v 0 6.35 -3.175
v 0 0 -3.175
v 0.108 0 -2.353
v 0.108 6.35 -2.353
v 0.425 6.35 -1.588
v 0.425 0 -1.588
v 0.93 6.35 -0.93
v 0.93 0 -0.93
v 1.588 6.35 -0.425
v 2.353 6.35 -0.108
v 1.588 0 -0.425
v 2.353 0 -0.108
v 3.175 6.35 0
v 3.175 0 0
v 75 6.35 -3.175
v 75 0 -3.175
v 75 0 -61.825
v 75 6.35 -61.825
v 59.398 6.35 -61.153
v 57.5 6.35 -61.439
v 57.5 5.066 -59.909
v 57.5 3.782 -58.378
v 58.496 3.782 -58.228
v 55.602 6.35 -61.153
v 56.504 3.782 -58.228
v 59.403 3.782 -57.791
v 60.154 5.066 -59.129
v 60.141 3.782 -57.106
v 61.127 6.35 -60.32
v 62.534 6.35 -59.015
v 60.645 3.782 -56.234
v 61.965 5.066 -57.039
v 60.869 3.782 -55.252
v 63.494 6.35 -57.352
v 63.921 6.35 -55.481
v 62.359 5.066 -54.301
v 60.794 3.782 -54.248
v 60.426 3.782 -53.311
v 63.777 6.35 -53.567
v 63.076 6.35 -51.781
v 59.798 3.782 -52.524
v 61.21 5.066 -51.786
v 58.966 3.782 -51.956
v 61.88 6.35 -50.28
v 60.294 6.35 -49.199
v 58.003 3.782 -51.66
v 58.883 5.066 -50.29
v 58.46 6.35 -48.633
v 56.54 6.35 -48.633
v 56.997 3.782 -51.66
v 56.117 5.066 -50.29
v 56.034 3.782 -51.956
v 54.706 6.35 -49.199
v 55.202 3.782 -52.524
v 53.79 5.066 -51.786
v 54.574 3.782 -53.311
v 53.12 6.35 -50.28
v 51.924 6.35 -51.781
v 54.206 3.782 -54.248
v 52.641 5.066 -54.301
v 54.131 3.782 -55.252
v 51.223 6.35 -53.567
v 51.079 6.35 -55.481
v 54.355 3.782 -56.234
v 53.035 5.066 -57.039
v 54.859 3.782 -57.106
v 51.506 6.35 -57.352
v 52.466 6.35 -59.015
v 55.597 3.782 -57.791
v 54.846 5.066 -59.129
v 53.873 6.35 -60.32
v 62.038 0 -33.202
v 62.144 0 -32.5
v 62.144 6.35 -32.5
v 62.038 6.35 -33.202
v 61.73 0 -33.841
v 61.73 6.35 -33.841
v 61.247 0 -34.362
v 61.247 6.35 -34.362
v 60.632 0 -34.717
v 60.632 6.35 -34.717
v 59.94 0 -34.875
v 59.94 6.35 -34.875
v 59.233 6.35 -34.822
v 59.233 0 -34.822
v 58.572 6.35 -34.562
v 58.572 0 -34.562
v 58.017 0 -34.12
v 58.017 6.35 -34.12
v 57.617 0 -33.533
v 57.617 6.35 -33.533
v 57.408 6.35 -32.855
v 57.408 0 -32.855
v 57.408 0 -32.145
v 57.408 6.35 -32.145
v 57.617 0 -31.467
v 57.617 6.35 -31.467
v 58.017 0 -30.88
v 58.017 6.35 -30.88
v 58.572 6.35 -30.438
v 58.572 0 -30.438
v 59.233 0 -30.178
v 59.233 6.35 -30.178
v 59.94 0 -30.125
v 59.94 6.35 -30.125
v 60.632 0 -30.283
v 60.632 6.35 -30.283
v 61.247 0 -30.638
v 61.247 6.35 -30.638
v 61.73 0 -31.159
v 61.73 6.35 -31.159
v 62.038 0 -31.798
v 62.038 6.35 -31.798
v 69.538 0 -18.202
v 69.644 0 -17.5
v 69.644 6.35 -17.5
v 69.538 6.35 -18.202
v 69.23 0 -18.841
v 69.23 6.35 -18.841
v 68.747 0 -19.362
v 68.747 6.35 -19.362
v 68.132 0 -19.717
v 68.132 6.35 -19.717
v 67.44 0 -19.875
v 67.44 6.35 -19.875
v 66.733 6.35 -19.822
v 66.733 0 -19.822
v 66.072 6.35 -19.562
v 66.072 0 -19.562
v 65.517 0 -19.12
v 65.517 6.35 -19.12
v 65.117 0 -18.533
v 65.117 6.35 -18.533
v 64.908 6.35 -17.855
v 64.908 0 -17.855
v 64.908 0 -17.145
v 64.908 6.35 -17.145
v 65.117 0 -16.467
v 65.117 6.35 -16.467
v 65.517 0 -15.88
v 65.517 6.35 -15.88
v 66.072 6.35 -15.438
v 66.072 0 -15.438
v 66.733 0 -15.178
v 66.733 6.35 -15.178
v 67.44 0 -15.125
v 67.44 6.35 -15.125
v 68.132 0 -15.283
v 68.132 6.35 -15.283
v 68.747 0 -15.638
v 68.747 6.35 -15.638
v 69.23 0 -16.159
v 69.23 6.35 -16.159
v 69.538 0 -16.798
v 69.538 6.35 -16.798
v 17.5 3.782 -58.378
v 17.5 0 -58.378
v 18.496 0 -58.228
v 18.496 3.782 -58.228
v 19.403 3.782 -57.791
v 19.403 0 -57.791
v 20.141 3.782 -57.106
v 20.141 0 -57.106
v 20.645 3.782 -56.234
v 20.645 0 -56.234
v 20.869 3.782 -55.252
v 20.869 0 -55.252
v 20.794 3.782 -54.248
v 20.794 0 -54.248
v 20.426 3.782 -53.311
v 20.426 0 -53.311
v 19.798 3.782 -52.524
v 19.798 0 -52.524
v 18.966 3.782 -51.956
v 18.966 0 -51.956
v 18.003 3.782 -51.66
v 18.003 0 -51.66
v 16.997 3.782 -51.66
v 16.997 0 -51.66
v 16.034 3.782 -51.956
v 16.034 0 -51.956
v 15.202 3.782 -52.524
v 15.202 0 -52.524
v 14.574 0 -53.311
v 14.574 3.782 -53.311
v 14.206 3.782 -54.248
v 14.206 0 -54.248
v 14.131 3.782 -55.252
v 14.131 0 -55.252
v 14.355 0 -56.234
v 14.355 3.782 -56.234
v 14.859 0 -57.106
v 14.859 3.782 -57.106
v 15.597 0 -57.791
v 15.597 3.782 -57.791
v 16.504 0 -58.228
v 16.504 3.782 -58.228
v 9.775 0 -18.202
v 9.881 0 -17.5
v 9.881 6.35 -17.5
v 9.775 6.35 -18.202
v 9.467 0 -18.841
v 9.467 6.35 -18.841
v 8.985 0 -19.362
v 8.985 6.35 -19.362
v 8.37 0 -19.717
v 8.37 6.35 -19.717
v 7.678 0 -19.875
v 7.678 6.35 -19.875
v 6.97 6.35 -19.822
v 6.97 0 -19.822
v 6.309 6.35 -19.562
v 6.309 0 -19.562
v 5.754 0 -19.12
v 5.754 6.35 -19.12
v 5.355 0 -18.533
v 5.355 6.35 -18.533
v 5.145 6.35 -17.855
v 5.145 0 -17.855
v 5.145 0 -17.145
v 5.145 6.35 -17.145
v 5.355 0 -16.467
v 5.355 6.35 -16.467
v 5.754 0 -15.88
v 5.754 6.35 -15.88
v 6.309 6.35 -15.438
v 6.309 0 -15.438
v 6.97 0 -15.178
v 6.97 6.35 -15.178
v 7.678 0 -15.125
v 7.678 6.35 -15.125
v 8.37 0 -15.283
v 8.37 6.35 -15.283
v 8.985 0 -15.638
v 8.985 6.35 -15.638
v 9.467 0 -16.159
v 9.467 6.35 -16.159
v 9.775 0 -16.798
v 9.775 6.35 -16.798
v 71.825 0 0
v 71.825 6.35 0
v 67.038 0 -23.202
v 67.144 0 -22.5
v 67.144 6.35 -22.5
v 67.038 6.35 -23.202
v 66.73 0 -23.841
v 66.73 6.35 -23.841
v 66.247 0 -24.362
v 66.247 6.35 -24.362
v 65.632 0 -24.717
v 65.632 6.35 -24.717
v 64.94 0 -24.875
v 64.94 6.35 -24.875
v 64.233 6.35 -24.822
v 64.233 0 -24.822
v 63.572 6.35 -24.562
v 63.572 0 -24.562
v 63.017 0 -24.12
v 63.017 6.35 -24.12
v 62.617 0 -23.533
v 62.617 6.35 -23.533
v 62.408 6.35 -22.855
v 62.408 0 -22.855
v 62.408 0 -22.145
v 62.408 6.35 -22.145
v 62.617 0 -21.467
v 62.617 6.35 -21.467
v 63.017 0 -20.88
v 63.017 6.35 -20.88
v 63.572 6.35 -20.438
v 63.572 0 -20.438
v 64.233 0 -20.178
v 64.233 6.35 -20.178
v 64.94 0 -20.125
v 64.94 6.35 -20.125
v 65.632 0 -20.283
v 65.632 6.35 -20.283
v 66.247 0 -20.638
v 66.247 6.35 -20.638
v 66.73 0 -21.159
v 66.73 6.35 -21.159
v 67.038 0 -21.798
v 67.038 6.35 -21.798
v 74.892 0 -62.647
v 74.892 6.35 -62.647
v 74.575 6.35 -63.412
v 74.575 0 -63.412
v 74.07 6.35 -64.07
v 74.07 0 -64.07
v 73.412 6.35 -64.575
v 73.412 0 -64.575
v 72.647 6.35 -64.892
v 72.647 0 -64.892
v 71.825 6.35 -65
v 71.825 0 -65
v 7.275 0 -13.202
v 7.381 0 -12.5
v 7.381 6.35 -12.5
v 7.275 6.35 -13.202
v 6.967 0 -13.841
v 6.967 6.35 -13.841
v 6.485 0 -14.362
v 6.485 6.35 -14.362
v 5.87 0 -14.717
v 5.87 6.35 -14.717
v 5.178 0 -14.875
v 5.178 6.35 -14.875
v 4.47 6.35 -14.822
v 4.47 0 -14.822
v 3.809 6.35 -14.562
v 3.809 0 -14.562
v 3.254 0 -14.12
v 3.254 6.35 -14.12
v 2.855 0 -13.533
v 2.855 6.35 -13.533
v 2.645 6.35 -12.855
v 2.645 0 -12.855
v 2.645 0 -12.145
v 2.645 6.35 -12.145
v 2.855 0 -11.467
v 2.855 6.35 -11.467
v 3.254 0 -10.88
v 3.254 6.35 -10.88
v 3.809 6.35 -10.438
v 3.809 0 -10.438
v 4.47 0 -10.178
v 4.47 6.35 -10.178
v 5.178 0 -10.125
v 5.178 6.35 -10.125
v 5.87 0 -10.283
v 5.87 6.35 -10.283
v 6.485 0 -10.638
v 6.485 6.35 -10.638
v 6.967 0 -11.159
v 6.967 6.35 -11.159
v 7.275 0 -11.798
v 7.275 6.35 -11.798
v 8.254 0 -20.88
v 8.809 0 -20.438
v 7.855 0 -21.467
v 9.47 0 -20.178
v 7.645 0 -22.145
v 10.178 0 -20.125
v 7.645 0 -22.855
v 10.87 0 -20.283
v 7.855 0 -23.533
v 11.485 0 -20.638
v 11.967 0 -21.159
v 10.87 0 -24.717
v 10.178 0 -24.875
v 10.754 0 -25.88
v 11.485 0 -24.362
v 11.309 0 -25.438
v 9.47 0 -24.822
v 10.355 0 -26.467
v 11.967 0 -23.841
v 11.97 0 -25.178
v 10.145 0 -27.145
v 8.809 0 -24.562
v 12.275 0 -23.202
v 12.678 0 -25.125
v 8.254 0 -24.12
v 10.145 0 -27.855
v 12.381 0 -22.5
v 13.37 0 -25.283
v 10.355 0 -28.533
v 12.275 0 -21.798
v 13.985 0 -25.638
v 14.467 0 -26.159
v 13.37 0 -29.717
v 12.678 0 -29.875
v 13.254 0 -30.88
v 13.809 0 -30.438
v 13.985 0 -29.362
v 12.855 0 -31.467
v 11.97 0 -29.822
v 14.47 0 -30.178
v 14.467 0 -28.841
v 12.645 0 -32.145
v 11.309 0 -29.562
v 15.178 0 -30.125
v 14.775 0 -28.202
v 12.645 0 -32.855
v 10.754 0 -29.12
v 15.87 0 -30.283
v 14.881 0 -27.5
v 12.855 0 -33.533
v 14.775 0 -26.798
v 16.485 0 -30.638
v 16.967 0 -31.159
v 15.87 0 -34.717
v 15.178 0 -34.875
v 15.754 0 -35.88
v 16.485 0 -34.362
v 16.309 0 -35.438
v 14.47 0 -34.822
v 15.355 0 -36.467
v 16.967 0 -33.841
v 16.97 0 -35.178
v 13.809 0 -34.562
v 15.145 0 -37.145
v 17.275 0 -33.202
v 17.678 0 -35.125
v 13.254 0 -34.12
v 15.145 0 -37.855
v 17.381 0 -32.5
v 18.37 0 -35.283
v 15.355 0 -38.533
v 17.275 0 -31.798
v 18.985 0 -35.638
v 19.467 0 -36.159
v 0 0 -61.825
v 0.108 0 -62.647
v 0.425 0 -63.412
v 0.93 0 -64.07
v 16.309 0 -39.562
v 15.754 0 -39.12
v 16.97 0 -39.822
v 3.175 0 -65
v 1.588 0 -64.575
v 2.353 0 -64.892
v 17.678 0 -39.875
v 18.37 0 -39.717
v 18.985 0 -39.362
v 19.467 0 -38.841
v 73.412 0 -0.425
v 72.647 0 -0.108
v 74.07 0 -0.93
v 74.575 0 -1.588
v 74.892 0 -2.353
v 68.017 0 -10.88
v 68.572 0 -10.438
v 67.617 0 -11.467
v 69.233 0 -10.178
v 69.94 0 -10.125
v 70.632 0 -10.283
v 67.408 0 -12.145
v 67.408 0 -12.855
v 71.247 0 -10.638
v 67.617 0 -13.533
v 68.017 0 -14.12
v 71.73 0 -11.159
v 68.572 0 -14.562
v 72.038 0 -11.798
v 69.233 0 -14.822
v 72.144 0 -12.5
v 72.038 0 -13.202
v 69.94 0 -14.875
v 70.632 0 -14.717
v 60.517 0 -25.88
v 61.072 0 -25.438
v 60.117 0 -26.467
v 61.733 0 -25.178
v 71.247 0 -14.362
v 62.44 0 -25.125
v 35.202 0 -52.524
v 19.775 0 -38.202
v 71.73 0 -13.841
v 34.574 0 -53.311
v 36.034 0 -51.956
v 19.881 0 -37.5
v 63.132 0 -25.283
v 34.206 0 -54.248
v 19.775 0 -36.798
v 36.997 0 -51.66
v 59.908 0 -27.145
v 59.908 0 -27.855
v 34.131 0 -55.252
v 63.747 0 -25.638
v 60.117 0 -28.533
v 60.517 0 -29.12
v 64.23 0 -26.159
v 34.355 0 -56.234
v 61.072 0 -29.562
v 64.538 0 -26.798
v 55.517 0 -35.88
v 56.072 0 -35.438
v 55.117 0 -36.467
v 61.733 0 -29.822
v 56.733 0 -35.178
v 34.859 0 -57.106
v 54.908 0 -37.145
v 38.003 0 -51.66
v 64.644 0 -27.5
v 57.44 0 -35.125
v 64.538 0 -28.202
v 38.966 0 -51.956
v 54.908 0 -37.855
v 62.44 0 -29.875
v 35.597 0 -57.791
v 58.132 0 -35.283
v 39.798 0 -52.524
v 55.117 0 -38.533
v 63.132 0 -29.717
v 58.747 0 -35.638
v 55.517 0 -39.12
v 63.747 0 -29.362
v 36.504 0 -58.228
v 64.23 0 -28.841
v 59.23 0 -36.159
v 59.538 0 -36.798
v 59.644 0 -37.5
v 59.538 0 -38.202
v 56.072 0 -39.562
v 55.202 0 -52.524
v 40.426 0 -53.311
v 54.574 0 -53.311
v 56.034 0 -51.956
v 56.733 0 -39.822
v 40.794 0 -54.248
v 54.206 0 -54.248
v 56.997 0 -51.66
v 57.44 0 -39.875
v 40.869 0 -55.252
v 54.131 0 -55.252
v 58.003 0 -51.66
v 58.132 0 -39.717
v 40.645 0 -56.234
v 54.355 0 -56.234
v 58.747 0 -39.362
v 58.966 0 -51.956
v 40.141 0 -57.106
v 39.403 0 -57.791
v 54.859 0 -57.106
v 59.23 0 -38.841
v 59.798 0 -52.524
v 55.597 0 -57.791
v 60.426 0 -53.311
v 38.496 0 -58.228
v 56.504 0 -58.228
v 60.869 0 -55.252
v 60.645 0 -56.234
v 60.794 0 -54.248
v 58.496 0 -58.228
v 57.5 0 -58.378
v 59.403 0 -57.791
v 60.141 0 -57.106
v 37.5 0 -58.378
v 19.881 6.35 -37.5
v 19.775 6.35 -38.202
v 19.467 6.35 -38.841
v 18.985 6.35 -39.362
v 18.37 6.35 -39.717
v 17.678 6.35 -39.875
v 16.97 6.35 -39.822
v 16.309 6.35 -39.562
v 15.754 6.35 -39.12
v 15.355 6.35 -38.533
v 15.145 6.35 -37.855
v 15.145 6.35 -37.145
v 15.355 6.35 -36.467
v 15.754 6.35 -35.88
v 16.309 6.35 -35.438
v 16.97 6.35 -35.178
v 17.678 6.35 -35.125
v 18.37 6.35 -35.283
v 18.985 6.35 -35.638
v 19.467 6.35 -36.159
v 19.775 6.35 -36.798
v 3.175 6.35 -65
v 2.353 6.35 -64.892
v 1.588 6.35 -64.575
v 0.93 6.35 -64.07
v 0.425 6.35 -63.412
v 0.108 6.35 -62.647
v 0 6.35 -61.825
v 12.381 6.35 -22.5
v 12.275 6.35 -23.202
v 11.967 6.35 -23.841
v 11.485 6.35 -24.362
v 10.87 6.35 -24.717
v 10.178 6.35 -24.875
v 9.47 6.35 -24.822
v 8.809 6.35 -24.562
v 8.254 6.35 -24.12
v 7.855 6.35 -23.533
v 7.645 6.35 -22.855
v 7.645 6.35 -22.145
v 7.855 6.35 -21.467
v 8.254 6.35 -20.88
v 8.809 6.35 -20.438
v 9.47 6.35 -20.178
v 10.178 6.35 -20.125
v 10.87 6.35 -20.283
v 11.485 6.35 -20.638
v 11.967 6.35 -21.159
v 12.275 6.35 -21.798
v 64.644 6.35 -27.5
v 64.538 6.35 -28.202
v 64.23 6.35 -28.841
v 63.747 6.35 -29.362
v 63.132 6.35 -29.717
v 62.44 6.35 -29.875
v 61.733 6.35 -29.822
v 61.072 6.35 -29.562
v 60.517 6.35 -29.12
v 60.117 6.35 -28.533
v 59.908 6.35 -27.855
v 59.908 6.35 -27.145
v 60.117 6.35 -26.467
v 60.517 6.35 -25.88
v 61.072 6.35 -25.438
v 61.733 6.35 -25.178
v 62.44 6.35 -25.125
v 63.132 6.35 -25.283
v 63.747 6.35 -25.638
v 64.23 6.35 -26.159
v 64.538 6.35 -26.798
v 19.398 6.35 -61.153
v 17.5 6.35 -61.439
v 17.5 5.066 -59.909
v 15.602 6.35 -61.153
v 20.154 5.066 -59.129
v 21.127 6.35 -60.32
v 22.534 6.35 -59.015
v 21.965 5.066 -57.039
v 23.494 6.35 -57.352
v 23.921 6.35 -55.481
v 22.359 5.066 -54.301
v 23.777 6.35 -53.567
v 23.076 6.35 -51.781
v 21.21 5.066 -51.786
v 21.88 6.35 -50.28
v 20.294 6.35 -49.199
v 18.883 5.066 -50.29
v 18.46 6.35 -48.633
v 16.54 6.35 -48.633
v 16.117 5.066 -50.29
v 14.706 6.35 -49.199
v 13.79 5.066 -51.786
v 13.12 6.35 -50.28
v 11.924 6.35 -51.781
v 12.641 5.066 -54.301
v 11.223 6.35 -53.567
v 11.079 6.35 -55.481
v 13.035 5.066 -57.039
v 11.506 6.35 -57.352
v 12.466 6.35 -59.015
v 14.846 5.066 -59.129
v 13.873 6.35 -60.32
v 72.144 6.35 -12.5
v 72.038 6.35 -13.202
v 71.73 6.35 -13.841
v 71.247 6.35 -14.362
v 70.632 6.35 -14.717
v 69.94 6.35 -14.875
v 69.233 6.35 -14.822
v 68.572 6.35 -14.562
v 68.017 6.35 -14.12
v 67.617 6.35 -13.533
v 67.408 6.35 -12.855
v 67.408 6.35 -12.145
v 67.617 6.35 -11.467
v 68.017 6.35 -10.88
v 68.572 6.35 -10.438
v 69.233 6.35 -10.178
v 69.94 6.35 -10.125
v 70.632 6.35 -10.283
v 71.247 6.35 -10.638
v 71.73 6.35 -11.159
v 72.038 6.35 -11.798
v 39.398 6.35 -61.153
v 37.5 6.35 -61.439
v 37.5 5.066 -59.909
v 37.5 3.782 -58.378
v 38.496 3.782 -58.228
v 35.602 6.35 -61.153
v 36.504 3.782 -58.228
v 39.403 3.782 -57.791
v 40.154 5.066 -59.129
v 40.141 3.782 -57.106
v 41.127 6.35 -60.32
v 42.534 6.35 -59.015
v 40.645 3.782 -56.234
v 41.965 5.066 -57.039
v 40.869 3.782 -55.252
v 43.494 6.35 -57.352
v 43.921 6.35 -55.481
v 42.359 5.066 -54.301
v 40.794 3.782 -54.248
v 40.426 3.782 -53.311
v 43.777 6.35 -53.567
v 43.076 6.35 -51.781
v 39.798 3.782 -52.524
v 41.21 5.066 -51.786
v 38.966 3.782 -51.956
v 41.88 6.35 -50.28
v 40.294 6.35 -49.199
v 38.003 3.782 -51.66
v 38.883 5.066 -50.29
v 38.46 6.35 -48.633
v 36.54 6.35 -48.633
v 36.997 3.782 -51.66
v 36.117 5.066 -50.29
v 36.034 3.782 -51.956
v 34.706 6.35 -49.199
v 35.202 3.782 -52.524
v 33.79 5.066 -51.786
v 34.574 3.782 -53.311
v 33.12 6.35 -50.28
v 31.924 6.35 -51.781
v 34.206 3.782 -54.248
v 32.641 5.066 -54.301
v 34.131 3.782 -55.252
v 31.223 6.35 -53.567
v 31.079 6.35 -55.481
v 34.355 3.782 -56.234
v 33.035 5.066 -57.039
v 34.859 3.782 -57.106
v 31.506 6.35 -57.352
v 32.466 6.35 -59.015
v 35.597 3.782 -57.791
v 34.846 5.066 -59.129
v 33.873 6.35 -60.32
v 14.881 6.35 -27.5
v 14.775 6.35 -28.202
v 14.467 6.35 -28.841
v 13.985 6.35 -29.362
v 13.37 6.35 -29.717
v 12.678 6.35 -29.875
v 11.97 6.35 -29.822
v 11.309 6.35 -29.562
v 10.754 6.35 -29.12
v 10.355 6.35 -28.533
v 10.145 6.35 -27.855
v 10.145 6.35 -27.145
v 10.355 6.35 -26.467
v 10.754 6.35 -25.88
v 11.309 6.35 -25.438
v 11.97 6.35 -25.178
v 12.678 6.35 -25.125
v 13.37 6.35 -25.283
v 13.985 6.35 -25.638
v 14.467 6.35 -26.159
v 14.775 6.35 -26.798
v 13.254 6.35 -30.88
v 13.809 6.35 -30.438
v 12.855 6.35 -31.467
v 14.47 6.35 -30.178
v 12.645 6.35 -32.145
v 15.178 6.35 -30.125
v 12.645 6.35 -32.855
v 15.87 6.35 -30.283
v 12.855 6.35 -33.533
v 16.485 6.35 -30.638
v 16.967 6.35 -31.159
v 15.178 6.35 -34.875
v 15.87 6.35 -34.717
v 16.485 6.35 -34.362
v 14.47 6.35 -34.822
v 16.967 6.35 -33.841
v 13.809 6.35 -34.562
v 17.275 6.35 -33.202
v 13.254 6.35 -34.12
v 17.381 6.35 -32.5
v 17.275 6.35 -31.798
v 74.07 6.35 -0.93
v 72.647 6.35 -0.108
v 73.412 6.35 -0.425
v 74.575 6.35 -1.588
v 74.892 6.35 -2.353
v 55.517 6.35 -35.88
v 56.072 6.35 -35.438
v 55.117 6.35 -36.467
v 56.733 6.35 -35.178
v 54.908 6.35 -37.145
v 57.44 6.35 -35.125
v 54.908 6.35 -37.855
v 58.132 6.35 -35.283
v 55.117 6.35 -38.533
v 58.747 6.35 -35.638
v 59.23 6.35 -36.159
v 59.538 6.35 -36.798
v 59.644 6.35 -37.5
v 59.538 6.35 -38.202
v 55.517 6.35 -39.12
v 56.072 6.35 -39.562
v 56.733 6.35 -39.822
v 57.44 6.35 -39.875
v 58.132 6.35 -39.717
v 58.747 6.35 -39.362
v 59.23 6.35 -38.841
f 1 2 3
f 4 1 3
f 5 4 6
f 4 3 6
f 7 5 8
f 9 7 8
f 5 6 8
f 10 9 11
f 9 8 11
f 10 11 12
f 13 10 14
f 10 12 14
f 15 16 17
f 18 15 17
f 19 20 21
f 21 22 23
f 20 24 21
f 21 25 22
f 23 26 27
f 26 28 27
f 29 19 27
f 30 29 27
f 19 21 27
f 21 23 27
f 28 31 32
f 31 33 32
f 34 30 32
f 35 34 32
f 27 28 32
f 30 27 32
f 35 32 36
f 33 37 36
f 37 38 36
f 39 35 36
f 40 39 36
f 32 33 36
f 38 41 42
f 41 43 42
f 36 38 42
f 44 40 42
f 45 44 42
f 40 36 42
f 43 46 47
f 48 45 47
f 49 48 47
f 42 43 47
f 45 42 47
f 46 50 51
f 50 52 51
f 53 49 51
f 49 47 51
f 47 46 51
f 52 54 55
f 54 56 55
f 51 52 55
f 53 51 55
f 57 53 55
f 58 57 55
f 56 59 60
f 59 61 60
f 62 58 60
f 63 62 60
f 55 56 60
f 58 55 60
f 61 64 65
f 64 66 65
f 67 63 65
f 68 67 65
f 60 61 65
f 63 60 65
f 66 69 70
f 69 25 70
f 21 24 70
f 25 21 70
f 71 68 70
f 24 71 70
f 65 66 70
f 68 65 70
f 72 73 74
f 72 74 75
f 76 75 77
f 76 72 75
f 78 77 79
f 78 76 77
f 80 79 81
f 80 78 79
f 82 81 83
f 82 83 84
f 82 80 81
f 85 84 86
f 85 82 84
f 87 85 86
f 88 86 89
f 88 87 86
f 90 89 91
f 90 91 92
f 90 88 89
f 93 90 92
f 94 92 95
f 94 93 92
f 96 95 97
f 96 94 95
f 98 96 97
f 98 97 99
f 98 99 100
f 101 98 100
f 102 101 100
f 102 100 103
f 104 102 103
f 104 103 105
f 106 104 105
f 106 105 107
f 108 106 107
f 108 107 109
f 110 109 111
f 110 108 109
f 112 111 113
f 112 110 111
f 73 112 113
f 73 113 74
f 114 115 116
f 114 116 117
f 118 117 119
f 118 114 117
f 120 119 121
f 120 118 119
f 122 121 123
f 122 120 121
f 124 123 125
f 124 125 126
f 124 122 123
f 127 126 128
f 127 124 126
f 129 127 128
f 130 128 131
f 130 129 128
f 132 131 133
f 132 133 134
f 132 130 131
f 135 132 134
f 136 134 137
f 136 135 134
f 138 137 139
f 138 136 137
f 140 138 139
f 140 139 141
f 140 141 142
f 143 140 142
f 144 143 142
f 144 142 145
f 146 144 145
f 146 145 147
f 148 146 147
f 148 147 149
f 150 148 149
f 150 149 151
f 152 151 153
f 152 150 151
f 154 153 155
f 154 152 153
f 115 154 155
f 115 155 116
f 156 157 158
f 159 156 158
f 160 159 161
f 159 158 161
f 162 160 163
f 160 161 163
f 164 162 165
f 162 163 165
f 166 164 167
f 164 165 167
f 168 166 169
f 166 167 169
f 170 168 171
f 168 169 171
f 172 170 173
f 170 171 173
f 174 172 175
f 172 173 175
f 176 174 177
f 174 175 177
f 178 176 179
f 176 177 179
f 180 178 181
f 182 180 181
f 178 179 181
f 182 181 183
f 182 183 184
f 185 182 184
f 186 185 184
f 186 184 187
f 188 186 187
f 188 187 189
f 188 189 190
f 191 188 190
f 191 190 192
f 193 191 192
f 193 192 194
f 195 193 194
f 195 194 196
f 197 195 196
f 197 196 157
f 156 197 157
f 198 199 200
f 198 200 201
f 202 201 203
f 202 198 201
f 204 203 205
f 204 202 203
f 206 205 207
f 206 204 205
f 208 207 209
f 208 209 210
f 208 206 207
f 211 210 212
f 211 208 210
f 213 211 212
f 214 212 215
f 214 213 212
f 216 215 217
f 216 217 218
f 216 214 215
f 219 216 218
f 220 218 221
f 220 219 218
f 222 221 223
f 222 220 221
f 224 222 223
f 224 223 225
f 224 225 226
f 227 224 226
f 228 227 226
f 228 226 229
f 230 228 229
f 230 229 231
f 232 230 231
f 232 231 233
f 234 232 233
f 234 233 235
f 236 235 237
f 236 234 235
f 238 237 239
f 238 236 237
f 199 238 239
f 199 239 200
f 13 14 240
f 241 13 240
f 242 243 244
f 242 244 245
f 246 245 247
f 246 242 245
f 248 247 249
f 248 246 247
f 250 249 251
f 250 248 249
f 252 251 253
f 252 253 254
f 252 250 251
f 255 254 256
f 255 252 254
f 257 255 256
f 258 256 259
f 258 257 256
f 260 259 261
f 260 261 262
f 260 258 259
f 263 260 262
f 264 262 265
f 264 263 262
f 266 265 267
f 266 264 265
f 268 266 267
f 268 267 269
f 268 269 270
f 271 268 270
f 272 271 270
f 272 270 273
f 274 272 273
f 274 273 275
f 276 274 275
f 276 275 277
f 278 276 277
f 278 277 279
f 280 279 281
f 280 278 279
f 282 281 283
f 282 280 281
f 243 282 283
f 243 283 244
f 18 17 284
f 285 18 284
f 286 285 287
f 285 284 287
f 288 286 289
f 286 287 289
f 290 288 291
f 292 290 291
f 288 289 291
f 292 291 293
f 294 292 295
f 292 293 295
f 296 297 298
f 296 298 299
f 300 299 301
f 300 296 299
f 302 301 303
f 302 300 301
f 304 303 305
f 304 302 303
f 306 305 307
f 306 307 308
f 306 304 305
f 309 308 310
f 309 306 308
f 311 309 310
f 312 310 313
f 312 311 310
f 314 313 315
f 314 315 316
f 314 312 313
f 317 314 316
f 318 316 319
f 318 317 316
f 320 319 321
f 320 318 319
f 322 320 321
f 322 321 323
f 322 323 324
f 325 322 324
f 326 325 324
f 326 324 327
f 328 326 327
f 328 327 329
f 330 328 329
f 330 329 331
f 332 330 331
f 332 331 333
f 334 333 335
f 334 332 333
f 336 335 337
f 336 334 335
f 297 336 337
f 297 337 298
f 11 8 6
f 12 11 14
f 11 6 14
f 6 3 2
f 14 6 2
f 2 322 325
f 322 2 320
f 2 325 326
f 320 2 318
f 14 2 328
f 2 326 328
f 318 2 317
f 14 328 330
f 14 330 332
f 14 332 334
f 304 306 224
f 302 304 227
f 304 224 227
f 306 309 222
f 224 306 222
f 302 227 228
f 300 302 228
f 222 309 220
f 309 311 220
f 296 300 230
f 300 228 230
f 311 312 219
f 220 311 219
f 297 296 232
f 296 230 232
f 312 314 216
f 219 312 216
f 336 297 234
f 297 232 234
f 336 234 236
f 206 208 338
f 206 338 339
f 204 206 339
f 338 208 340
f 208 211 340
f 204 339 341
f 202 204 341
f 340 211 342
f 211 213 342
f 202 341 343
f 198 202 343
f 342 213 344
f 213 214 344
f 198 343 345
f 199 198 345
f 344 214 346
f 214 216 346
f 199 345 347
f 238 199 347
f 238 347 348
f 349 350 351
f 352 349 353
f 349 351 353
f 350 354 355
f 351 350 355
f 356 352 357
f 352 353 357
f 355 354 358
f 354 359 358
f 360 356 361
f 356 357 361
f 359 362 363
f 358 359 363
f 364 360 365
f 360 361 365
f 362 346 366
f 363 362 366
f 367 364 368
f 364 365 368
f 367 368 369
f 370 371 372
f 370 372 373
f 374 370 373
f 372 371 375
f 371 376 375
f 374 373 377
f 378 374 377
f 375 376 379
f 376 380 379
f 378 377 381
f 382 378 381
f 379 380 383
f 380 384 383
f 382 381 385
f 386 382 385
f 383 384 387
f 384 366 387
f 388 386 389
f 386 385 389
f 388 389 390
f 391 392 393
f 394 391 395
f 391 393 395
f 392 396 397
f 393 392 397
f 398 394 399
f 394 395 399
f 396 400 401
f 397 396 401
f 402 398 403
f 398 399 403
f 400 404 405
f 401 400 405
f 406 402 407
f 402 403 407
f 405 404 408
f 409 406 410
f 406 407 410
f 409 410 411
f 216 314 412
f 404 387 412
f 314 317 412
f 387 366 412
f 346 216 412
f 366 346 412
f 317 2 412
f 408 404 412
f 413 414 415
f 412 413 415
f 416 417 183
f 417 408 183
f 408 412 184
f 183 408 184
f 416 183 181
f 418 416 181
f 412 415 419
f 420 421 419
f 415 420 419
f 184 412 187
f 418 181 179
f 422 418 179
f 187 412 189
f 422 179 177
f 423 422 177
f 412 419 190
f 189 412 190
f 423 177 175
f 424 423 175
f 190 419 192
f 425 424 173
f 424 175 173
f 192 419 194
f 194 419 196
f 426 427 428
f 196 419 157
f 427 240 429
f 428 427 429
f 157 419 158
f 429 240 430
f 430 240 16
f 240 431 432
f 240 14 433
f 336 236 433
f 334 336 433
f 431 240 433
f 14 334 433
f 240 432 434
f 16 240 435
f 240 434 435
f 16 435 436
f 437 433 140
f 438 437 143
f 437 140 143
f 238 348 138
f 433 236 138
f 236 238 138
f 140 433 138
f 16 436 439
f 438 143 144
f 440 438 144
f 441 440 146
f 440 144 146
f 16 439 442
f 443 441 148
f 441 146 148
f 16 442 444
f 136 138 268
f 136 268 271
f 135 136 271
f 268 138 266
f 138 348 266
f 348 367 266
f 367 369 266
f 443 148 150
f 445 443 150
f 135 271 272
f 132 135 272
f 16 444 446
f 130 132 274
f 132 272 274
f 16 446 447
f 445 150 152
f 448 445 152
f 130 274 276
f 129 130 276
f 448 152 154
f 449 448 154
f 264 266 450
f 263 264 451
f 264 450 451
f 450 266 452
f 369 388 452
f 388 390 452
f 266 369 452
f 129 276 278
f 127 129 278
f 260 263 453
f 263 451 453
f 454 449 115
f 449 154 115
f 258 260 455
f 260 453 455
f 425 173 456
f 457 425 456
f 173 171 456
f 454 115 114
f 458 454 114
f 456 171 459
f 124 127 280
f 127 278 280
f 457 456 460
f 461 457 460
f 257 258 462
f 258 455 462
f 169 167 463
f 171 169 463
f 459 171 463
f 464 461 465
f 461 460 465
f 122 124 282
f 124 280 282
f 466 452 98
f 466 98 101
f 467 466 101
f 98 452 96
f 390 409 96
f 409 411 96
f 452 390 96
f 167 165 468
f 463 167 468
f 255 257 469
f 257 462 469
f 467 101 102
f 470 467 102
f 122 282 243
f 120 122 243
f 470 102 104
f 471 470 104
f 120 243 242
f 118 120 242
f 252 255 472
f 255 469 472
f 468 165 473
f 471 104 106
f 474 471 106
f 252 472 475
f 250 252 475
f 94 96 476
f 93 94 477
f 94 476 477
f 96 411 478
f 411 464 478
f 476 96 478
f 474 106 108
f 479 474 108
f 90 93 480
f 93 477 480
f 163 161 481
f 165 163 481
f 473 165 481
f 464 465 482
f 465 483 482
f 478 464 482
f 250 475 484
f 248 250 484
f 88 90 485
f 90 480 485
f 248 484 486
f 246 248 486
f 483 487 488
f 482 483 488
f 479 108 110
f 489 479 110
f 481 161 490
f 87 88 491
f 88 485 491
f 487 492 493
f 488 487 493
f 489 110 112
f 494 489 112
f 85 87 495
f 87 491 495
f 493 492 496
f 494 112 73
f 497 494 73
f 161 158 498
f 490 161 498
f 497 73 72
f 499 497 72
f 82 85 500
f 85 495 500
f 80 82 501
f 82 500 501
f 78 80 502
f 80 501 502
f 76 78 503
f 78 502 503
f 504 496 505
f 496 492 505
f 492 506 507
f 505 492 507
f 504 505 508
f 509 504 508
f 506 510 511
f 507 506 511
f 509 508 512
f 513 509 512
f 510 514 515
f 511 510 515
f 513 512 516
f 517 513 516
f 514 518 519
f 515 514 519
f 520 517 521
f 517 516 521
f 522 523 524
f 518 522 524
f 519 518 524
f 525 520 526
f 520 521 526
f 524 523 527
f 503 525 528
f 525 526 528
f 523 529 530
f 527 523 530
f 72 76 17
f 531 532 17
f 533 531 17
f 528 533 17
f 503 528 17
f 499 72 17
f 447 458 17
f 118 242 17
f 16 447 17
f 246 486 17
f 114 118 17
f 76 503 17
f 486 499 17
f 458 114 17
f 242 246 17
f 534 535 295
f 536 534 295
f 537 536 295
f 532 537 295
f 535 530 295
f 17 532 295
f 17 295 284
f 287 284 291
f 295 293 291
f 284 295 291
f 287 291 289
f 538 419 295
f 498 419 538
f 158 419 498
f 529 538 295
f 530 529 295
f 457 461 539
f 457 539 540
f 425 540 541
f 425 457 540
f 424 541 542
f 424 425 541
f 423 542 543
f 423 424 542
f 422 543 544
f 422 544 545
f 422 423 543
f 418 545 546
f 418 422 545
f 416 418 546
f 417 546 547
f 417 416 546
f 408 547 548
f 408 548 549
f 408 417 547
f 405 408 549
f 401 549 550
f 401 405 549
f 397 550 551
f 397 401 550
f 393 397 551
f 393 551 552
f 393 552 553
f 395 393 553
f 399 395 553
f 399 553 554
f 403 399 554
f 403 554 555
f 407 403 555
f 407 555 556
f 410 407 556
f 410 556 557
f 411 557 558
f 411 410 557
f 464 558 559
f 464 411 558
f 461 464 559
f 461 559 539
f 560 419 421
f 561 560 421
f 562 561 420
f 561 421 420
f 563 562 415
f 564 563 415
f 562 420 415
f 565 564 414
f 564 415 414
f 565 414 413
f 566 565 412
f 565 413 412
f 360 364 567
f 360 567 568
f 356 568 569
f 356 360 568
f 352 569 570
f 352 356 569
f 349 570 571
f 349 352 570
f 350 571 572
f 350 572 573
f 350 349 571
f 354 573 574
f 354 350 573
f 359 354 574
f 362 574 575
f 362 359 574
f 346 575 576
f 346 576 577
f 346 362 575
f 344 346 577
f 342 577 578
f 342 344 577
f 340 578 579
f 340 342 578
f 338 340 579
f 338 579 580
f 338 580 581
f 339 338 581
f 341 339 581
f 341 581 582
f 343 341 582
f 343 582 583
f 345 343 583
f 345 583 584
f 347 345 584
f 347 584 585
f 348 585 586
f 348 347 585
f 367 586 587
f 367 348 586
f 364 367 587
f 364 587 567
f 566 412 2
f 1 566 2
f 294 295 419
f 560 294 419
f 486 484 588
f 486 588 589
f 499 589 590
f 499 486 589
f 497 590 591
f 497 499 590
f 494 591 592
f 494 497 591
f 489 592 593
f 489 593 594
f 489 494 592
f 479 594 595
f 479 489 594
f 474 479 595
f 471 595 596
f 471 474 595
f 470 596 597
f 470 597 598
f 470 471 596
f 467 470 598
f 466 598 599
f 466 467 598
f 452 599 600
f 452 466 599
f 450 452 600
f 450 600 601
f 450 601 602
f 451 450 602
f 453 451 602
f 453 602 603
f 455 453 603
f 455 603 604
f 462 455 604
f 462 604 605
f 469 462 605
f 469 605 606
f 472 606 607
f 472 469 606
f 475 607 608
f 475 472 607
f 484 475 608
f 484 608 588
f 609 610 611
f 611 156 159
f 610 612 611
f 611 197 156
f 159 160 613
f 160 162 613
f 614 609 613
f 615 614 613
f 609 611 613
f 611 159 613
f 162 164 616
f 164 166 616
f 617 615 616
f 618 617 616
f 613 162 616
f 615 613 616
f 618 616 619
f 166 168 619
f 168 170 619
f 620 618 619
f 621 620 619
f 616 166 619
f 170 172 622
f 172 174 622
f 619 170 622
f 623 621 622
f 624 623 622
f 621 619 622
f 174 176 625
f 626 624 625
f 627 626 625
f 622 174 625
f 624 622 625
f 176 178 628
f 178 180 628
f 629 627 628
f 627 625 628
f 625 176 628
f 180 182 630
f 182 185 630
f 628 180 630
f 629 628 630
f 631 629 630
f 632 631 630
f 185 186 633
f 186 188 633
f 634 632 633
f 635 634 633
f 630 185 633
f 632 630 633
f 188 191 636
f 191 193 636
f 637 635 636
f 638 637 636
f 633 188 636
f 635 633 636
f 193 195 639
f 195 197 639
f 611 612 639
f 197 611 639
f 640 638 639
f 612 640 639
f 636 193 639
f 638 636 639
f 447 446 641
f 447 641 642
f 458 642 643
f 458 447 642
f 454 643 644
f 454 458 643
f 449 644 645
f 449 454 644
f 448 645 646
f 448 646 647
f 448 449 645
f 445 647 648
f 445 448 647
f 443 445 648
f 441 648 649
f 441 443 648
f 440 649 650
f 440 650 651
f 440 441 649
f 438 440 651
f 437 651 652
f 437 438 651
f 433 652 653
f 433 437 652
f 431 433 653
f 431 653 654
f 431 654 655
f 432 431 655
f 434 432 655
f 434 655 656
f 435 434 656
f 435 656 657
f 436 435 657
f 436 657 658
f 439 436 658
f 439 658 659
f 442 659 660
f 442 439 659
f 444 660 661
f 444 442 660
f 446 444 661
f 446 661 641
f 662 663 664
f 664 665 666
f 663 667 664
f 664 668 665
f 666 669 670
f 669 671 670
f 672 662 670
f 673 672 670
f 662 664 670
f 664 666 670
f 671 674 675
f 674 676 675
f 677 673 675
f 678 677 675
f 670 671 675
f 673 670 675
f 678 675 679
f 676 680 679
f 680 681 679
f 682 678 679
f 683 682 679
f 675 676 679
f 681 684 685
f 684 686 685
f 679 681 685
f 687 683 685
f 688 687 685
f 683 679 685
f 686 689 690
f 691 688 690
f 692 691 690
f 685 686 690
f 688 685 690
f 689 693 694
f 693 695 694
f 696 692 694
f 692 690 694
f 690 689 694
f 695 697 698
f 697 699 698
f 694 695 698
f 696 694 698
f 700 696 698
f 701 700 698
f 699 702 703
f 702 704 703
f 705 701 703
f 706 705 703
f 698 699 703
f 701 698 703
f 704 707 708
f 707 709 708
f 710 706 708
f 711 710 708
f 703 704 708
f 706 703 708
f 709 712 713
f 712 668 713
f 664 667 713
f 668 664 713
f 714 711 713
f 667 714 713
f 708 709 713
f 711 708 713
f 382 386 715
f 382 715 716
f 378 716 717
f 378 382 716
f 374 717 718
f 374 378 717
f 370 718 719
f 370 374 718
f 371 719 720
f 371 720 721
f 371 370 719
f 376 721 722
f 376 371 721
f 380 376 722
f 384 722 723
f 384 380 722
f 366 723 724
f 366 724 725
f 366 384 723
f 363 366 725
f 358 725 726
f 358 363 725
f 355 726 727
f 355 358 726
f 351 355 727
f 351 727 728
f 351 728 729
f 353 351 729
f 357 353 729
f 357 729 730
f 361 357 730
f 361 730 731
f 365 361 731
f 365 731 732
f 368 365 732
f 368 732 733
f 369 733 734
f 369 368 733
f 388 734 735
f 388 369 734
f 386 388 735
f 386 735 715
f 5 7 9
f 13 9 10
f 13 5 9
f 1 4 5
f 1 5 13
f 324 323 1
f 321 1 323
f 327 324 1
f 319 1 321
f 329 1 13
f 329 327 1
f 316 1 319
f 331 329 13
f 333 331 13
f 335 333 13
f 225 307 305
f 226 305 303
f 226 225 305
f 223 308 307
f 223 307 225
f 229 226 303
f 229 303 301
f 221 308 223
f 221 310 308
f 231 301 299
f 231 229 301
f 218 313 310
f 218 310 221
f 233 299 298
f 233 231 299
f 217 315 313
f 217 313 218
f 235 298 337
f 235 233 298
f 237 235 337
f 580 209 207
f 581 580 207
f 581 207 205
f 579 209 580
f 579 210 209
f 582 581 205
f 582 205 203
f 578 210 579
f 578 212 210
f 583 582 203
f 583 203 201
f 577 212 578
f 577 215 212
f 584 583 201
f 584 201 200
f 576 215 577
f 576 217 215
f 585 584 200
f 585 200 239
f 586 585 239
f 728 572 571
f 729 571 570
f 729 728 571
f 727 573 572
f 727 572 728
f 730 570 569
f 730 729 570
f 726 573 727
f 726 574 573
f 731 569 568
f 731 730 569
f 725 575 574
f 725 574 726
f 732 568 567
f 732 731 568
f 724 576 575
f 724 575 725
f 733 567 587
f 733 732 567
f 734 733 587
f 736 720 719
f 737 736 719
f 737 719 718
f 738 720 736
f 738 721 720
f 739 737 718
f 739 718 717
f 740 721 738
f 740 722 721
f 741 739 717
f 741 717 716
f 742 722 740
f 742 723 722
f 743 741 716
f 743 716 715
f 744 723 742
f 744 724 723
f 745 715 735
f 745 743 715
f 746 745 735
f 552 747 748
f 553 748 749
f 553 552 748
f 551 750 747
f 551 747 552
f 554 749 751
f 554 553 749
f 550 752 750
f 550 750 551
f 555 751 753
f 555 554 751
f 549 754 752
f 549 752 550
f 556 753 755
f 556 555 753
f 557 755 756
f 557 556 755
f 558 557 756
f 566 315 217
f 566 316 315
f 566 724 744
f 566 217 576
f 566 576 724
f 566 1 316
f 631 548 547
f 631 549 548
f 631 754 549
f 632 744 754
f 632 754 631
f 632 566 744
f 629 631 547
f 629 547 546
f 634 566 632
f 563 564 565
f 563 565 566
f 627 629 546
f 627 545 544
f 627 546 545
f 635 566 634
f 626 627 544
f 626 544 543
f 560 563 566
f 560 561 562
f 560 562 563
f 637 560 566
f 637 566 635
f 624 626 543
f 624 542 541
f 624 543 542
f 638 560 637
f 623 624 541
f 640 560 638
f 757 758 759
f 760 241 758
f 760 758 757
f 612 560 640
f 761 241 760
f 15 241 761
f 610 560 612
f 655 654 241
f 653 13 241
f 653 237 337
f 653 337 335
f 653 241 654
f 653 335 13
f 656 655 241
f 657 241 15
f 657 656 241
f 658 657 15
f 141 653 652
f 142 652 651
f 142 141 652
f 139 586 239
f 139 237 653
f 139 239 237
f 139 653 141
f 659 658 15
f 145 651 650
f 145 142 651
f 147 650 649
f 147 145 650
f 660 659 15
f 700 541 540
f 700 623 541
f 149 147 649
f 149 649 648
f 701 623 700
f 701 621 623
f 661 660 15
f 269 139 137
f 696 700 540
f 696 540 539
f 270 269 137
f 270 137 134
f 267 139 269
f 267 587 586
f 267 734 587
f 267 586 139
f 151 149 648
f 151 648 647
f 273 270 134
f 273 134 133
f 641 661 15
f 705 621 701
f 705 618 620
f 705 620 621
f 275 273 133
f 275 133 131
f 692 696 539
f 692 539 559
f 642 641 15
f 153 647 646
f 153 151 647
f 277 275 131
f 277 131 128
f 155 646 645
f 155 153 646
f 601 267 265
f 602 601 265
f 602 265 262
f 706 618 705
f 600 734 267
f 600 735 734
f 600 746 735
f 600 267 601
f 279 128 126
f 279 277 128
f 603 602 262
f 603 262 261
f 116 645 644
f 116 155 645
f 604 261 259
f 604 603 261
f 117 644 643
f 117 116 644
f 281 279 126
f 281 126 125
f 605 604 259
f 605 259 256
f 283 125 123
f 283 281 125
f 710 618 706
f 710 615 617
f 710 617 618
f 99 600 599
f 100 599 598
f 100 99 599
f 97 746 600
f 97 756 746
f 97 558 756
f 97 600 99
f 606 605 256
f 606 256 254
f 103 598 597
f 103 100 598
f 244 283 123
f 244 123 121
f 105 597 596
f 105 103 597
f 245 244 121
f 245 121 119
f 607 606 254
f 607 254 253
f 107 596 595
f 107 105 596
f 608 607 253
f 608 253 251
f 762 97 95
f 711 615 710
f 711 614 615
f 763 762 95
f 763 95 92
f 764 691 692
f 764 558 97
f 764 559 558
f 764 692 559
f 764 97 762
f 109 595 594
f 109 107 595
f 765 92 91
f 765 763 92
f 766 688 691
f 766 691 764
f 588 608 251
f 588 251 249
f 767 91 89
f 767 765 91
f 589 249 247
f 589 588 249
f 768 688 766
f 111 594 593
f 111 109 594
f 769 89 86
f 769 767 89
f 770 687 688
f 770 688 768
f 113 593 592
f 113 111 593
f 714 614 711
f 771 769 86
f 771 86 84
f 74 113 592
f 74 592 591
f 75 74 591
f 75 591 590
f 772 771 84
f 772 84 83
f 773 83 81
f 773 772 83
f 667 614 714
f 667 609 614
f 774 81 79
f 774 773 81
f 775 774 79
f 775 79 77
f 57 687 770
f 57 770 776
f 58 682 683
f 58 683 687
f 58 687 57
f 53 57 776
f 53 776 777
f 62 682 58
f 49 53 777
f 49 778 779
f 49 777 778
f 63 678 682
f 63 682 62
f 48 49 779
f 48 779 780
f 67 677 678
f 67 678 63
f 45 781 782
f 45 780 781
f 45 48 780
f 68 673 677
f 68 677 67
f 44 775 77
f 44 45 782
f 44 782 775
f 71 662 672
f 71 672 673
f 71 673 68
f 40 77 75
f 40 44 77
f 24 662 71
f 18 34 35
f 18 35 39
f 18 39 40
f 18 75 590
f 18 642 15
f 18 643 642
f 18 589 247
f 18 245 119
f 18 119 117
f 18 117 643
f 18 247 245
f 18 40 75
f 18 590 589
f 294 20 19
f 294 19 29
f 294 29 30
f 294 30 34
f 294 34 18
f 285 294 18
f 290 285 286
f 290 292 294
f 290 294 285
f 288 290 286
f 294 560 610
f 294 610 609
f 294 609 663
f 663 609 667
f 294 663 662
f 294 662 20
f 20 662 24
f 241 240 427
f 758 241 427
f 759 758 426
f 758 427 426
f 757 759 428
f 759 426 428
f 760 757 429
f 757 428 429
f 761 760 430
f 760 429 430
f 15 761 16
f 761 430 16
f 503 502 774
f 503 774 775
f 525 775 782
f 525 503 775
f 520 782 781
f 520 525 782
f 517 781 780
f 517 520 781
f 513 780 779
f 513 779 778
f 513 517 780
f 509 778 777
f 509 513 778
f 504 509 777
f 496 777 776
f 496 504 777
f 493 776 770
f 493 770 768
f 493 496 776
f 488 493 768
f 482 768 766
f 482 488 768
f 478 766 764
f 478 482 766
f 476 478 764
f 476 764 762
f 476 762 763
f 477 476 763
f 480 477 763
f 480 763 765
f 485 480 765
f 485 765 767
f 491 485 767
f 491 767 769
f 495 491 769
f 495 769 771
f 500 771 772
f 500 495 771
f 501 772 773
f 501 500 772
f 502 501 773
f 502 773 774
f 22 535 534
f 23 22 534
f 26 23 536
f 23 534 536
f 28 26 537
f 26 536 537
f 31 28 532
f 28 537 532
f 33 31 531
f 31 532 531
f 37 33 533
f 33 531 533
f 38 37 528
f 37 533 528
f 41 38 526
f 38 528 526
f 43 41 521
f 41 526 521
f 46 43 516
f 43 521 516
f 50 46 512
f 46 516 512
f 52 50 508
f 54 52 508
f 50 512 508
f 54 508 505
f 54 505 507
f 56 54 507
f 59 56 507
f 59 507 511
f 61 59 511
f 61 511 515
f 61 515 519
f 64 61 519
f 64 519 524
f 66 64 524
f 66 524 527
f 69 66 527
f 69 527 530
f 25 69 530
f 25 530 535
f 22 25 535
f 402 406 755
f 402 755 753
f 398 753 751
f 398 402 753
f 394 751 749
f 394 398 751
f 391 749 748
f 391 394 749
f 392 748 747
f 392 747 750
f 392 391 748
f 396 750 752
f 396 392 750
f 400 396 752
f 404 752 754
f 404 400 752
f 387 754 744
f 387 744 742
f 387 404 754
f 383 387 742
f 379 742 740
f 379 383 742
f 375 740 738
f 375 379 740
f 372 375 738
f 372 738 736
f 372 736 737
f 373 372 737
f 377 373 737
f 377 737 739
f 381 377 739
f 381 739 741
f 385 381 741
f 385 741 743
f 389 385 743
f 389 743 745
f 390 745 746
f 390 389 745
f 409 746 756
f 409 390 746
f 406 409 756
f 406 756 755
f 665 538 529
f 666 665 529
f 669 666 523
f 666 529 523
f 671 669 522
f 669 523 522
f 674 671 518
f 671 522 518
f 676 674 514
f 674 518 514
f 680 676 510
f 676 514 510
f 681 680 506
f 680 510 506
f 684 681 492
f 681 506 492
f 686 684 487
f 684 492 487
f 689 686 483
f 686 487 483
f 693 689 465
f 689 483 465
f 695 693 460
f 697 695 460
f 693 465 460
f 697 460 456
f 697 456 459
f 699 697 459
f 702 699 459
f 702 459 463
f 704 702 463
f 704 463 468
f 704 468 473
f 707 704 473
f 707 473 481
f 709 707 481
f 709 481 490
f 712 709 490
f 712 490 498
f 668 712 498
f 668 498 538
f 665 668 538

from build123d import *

# Parameters (mm, degrees)
SKETCH1_R                                           = 2.38125
SKETCH1_R_2                                         = 3.3
BOSS_EXTRUDE1_DEPTH                                 = 6.35
CSK_FOR_1_4_FLAT_HEAD_MACHINE_SCREW_100_D           = 6.7564
CSK_FOR_1_4_FLAT_HEAD_MACHINE_SCREW_100_DEPTH       = 6.35
CSK_FOR_1_4_FLAT_HEAD_MACHINE_SCREW_100_CSINK_D     = 12.8778
CSK_FOR_1_4_FLAT_HEAD_MACHINE_SCREW_100_CSINK_ANGLE = 100


with BuildPart() as part:
    # Sketch1 → Boss-Extrude1 (new body)
    with BuildSketch(Plane(origin=(0, 0, 0), x_dir=(1, 0, 0), z_dir=(0, 1, 0))):
        with BuildLine():
            Line((3.175, 0), (71.825, 0))
            ThreePointArc((71.825, 0), (74.07006403, 0.92993597), (75, 3.175))
            Line((75, 3.175), (75, 61.825))
            ThreePointArc((75, 61.825), (74.07006403, 64.07006403), (71.825, 65))
            Line((71.825, 65), (3.175, 65))
            ThreePointArc((3.175, 65), (0.92993597, 64.07006403), (0, 61.825))
            Line((0, 61.825), (0, 3.175))
            ThreePointArc((0, 3.175), (0.92993597, 0.92993597), (3.175, 0))
        make_face()
        with Locations((5, 12.5)):
            Circle(SKETCH1_R, mode=Mode.SUBTRACT)
        with Locations((69.7625, 12.5)):
            Circle(SKETCH1_R, mode=Mode.SUBTRACT)
        with Locations((7.5, 17.5)):
            Circle(SKETCH1_R, mode=Mode.SUBTRACT)
        with Locations((67.2625, 17.5)):
            Circle(SKETCH1_R, mode=Mode.SUBTRACT)
        with Locations((10, 22.5)):
            Circle(SKETCH1_R, mode=Mode.SUBTRACT)
        with Locations((64.7625, 22.5)):
            Circle(SKETCH1_R, mode=Mode.SUBTRACT)
        with Locations((12.5, 27.5)):
            Circle(SKETCH1_R, mode=Mode.SUBTRACT)
        with Locations((62.2625, 27.5)):
            Circle(SKETCH1_R, mode=Mode.SUBTRACT)
        with Locations((15, 32.5)):
            Circle(SKETCH1_R, mode=Mode.SUBTRACT)
        with Locations((59.7625, 32.5)):
            Circle(SKETCH1_R, mode=Mode.SUBTRACT)
        with Locations((17.5, 37.5)):
            Circle(SKETCH1_R, mode=Mode.SUBTRACT)
        with Locations((57.2625, 37.5)):
            Circle(SKETCH1_R, mode=Mode.SUBTRACT)
        with Locations((37.5, 55)):
            Circle(SKETCH1_R_2, mode=Mode.SUBTRACT)
        with Locations((17.5, 55)):
            Circle(SKETCH1_R_2, mode=Mode.SUBTRACT)
        with Locations((57.5, 55)):
            Circle(SKETCH1_R_2, mode=Mode.SUBTRACT)
    extrude(amount=BOSS_EXTRUDE1_DEPTH)

    # CSK for 1/4 Flat Head Machine Screw (100)1
    with Locations(Plane(origin=(17.5, 6.35, -55), x_dir=(0, 0, 1), z_dir=(0, 1, 0))):
        with Locations((0, 0), (0, 40), (0, 20)):
            CounterSinkHole(CSK_FOR_1_4_FLAT_HEAD_MACHINE_SCREW_100_D / 2, CSK_FOR_1_4_FLAT_HEAD_MACHINE_SCREW_100_CSINK_D / 2, depth=CSK_FOR_1_4_FLAT_HEAD_MACHINE_SCREW_100_DEPTH, counter_sink_angle=CSK_FOR_1_4_FLAT_HEAD_MACHINE_SCREW_100_CSINK_ANGLE)


solid = part.part
